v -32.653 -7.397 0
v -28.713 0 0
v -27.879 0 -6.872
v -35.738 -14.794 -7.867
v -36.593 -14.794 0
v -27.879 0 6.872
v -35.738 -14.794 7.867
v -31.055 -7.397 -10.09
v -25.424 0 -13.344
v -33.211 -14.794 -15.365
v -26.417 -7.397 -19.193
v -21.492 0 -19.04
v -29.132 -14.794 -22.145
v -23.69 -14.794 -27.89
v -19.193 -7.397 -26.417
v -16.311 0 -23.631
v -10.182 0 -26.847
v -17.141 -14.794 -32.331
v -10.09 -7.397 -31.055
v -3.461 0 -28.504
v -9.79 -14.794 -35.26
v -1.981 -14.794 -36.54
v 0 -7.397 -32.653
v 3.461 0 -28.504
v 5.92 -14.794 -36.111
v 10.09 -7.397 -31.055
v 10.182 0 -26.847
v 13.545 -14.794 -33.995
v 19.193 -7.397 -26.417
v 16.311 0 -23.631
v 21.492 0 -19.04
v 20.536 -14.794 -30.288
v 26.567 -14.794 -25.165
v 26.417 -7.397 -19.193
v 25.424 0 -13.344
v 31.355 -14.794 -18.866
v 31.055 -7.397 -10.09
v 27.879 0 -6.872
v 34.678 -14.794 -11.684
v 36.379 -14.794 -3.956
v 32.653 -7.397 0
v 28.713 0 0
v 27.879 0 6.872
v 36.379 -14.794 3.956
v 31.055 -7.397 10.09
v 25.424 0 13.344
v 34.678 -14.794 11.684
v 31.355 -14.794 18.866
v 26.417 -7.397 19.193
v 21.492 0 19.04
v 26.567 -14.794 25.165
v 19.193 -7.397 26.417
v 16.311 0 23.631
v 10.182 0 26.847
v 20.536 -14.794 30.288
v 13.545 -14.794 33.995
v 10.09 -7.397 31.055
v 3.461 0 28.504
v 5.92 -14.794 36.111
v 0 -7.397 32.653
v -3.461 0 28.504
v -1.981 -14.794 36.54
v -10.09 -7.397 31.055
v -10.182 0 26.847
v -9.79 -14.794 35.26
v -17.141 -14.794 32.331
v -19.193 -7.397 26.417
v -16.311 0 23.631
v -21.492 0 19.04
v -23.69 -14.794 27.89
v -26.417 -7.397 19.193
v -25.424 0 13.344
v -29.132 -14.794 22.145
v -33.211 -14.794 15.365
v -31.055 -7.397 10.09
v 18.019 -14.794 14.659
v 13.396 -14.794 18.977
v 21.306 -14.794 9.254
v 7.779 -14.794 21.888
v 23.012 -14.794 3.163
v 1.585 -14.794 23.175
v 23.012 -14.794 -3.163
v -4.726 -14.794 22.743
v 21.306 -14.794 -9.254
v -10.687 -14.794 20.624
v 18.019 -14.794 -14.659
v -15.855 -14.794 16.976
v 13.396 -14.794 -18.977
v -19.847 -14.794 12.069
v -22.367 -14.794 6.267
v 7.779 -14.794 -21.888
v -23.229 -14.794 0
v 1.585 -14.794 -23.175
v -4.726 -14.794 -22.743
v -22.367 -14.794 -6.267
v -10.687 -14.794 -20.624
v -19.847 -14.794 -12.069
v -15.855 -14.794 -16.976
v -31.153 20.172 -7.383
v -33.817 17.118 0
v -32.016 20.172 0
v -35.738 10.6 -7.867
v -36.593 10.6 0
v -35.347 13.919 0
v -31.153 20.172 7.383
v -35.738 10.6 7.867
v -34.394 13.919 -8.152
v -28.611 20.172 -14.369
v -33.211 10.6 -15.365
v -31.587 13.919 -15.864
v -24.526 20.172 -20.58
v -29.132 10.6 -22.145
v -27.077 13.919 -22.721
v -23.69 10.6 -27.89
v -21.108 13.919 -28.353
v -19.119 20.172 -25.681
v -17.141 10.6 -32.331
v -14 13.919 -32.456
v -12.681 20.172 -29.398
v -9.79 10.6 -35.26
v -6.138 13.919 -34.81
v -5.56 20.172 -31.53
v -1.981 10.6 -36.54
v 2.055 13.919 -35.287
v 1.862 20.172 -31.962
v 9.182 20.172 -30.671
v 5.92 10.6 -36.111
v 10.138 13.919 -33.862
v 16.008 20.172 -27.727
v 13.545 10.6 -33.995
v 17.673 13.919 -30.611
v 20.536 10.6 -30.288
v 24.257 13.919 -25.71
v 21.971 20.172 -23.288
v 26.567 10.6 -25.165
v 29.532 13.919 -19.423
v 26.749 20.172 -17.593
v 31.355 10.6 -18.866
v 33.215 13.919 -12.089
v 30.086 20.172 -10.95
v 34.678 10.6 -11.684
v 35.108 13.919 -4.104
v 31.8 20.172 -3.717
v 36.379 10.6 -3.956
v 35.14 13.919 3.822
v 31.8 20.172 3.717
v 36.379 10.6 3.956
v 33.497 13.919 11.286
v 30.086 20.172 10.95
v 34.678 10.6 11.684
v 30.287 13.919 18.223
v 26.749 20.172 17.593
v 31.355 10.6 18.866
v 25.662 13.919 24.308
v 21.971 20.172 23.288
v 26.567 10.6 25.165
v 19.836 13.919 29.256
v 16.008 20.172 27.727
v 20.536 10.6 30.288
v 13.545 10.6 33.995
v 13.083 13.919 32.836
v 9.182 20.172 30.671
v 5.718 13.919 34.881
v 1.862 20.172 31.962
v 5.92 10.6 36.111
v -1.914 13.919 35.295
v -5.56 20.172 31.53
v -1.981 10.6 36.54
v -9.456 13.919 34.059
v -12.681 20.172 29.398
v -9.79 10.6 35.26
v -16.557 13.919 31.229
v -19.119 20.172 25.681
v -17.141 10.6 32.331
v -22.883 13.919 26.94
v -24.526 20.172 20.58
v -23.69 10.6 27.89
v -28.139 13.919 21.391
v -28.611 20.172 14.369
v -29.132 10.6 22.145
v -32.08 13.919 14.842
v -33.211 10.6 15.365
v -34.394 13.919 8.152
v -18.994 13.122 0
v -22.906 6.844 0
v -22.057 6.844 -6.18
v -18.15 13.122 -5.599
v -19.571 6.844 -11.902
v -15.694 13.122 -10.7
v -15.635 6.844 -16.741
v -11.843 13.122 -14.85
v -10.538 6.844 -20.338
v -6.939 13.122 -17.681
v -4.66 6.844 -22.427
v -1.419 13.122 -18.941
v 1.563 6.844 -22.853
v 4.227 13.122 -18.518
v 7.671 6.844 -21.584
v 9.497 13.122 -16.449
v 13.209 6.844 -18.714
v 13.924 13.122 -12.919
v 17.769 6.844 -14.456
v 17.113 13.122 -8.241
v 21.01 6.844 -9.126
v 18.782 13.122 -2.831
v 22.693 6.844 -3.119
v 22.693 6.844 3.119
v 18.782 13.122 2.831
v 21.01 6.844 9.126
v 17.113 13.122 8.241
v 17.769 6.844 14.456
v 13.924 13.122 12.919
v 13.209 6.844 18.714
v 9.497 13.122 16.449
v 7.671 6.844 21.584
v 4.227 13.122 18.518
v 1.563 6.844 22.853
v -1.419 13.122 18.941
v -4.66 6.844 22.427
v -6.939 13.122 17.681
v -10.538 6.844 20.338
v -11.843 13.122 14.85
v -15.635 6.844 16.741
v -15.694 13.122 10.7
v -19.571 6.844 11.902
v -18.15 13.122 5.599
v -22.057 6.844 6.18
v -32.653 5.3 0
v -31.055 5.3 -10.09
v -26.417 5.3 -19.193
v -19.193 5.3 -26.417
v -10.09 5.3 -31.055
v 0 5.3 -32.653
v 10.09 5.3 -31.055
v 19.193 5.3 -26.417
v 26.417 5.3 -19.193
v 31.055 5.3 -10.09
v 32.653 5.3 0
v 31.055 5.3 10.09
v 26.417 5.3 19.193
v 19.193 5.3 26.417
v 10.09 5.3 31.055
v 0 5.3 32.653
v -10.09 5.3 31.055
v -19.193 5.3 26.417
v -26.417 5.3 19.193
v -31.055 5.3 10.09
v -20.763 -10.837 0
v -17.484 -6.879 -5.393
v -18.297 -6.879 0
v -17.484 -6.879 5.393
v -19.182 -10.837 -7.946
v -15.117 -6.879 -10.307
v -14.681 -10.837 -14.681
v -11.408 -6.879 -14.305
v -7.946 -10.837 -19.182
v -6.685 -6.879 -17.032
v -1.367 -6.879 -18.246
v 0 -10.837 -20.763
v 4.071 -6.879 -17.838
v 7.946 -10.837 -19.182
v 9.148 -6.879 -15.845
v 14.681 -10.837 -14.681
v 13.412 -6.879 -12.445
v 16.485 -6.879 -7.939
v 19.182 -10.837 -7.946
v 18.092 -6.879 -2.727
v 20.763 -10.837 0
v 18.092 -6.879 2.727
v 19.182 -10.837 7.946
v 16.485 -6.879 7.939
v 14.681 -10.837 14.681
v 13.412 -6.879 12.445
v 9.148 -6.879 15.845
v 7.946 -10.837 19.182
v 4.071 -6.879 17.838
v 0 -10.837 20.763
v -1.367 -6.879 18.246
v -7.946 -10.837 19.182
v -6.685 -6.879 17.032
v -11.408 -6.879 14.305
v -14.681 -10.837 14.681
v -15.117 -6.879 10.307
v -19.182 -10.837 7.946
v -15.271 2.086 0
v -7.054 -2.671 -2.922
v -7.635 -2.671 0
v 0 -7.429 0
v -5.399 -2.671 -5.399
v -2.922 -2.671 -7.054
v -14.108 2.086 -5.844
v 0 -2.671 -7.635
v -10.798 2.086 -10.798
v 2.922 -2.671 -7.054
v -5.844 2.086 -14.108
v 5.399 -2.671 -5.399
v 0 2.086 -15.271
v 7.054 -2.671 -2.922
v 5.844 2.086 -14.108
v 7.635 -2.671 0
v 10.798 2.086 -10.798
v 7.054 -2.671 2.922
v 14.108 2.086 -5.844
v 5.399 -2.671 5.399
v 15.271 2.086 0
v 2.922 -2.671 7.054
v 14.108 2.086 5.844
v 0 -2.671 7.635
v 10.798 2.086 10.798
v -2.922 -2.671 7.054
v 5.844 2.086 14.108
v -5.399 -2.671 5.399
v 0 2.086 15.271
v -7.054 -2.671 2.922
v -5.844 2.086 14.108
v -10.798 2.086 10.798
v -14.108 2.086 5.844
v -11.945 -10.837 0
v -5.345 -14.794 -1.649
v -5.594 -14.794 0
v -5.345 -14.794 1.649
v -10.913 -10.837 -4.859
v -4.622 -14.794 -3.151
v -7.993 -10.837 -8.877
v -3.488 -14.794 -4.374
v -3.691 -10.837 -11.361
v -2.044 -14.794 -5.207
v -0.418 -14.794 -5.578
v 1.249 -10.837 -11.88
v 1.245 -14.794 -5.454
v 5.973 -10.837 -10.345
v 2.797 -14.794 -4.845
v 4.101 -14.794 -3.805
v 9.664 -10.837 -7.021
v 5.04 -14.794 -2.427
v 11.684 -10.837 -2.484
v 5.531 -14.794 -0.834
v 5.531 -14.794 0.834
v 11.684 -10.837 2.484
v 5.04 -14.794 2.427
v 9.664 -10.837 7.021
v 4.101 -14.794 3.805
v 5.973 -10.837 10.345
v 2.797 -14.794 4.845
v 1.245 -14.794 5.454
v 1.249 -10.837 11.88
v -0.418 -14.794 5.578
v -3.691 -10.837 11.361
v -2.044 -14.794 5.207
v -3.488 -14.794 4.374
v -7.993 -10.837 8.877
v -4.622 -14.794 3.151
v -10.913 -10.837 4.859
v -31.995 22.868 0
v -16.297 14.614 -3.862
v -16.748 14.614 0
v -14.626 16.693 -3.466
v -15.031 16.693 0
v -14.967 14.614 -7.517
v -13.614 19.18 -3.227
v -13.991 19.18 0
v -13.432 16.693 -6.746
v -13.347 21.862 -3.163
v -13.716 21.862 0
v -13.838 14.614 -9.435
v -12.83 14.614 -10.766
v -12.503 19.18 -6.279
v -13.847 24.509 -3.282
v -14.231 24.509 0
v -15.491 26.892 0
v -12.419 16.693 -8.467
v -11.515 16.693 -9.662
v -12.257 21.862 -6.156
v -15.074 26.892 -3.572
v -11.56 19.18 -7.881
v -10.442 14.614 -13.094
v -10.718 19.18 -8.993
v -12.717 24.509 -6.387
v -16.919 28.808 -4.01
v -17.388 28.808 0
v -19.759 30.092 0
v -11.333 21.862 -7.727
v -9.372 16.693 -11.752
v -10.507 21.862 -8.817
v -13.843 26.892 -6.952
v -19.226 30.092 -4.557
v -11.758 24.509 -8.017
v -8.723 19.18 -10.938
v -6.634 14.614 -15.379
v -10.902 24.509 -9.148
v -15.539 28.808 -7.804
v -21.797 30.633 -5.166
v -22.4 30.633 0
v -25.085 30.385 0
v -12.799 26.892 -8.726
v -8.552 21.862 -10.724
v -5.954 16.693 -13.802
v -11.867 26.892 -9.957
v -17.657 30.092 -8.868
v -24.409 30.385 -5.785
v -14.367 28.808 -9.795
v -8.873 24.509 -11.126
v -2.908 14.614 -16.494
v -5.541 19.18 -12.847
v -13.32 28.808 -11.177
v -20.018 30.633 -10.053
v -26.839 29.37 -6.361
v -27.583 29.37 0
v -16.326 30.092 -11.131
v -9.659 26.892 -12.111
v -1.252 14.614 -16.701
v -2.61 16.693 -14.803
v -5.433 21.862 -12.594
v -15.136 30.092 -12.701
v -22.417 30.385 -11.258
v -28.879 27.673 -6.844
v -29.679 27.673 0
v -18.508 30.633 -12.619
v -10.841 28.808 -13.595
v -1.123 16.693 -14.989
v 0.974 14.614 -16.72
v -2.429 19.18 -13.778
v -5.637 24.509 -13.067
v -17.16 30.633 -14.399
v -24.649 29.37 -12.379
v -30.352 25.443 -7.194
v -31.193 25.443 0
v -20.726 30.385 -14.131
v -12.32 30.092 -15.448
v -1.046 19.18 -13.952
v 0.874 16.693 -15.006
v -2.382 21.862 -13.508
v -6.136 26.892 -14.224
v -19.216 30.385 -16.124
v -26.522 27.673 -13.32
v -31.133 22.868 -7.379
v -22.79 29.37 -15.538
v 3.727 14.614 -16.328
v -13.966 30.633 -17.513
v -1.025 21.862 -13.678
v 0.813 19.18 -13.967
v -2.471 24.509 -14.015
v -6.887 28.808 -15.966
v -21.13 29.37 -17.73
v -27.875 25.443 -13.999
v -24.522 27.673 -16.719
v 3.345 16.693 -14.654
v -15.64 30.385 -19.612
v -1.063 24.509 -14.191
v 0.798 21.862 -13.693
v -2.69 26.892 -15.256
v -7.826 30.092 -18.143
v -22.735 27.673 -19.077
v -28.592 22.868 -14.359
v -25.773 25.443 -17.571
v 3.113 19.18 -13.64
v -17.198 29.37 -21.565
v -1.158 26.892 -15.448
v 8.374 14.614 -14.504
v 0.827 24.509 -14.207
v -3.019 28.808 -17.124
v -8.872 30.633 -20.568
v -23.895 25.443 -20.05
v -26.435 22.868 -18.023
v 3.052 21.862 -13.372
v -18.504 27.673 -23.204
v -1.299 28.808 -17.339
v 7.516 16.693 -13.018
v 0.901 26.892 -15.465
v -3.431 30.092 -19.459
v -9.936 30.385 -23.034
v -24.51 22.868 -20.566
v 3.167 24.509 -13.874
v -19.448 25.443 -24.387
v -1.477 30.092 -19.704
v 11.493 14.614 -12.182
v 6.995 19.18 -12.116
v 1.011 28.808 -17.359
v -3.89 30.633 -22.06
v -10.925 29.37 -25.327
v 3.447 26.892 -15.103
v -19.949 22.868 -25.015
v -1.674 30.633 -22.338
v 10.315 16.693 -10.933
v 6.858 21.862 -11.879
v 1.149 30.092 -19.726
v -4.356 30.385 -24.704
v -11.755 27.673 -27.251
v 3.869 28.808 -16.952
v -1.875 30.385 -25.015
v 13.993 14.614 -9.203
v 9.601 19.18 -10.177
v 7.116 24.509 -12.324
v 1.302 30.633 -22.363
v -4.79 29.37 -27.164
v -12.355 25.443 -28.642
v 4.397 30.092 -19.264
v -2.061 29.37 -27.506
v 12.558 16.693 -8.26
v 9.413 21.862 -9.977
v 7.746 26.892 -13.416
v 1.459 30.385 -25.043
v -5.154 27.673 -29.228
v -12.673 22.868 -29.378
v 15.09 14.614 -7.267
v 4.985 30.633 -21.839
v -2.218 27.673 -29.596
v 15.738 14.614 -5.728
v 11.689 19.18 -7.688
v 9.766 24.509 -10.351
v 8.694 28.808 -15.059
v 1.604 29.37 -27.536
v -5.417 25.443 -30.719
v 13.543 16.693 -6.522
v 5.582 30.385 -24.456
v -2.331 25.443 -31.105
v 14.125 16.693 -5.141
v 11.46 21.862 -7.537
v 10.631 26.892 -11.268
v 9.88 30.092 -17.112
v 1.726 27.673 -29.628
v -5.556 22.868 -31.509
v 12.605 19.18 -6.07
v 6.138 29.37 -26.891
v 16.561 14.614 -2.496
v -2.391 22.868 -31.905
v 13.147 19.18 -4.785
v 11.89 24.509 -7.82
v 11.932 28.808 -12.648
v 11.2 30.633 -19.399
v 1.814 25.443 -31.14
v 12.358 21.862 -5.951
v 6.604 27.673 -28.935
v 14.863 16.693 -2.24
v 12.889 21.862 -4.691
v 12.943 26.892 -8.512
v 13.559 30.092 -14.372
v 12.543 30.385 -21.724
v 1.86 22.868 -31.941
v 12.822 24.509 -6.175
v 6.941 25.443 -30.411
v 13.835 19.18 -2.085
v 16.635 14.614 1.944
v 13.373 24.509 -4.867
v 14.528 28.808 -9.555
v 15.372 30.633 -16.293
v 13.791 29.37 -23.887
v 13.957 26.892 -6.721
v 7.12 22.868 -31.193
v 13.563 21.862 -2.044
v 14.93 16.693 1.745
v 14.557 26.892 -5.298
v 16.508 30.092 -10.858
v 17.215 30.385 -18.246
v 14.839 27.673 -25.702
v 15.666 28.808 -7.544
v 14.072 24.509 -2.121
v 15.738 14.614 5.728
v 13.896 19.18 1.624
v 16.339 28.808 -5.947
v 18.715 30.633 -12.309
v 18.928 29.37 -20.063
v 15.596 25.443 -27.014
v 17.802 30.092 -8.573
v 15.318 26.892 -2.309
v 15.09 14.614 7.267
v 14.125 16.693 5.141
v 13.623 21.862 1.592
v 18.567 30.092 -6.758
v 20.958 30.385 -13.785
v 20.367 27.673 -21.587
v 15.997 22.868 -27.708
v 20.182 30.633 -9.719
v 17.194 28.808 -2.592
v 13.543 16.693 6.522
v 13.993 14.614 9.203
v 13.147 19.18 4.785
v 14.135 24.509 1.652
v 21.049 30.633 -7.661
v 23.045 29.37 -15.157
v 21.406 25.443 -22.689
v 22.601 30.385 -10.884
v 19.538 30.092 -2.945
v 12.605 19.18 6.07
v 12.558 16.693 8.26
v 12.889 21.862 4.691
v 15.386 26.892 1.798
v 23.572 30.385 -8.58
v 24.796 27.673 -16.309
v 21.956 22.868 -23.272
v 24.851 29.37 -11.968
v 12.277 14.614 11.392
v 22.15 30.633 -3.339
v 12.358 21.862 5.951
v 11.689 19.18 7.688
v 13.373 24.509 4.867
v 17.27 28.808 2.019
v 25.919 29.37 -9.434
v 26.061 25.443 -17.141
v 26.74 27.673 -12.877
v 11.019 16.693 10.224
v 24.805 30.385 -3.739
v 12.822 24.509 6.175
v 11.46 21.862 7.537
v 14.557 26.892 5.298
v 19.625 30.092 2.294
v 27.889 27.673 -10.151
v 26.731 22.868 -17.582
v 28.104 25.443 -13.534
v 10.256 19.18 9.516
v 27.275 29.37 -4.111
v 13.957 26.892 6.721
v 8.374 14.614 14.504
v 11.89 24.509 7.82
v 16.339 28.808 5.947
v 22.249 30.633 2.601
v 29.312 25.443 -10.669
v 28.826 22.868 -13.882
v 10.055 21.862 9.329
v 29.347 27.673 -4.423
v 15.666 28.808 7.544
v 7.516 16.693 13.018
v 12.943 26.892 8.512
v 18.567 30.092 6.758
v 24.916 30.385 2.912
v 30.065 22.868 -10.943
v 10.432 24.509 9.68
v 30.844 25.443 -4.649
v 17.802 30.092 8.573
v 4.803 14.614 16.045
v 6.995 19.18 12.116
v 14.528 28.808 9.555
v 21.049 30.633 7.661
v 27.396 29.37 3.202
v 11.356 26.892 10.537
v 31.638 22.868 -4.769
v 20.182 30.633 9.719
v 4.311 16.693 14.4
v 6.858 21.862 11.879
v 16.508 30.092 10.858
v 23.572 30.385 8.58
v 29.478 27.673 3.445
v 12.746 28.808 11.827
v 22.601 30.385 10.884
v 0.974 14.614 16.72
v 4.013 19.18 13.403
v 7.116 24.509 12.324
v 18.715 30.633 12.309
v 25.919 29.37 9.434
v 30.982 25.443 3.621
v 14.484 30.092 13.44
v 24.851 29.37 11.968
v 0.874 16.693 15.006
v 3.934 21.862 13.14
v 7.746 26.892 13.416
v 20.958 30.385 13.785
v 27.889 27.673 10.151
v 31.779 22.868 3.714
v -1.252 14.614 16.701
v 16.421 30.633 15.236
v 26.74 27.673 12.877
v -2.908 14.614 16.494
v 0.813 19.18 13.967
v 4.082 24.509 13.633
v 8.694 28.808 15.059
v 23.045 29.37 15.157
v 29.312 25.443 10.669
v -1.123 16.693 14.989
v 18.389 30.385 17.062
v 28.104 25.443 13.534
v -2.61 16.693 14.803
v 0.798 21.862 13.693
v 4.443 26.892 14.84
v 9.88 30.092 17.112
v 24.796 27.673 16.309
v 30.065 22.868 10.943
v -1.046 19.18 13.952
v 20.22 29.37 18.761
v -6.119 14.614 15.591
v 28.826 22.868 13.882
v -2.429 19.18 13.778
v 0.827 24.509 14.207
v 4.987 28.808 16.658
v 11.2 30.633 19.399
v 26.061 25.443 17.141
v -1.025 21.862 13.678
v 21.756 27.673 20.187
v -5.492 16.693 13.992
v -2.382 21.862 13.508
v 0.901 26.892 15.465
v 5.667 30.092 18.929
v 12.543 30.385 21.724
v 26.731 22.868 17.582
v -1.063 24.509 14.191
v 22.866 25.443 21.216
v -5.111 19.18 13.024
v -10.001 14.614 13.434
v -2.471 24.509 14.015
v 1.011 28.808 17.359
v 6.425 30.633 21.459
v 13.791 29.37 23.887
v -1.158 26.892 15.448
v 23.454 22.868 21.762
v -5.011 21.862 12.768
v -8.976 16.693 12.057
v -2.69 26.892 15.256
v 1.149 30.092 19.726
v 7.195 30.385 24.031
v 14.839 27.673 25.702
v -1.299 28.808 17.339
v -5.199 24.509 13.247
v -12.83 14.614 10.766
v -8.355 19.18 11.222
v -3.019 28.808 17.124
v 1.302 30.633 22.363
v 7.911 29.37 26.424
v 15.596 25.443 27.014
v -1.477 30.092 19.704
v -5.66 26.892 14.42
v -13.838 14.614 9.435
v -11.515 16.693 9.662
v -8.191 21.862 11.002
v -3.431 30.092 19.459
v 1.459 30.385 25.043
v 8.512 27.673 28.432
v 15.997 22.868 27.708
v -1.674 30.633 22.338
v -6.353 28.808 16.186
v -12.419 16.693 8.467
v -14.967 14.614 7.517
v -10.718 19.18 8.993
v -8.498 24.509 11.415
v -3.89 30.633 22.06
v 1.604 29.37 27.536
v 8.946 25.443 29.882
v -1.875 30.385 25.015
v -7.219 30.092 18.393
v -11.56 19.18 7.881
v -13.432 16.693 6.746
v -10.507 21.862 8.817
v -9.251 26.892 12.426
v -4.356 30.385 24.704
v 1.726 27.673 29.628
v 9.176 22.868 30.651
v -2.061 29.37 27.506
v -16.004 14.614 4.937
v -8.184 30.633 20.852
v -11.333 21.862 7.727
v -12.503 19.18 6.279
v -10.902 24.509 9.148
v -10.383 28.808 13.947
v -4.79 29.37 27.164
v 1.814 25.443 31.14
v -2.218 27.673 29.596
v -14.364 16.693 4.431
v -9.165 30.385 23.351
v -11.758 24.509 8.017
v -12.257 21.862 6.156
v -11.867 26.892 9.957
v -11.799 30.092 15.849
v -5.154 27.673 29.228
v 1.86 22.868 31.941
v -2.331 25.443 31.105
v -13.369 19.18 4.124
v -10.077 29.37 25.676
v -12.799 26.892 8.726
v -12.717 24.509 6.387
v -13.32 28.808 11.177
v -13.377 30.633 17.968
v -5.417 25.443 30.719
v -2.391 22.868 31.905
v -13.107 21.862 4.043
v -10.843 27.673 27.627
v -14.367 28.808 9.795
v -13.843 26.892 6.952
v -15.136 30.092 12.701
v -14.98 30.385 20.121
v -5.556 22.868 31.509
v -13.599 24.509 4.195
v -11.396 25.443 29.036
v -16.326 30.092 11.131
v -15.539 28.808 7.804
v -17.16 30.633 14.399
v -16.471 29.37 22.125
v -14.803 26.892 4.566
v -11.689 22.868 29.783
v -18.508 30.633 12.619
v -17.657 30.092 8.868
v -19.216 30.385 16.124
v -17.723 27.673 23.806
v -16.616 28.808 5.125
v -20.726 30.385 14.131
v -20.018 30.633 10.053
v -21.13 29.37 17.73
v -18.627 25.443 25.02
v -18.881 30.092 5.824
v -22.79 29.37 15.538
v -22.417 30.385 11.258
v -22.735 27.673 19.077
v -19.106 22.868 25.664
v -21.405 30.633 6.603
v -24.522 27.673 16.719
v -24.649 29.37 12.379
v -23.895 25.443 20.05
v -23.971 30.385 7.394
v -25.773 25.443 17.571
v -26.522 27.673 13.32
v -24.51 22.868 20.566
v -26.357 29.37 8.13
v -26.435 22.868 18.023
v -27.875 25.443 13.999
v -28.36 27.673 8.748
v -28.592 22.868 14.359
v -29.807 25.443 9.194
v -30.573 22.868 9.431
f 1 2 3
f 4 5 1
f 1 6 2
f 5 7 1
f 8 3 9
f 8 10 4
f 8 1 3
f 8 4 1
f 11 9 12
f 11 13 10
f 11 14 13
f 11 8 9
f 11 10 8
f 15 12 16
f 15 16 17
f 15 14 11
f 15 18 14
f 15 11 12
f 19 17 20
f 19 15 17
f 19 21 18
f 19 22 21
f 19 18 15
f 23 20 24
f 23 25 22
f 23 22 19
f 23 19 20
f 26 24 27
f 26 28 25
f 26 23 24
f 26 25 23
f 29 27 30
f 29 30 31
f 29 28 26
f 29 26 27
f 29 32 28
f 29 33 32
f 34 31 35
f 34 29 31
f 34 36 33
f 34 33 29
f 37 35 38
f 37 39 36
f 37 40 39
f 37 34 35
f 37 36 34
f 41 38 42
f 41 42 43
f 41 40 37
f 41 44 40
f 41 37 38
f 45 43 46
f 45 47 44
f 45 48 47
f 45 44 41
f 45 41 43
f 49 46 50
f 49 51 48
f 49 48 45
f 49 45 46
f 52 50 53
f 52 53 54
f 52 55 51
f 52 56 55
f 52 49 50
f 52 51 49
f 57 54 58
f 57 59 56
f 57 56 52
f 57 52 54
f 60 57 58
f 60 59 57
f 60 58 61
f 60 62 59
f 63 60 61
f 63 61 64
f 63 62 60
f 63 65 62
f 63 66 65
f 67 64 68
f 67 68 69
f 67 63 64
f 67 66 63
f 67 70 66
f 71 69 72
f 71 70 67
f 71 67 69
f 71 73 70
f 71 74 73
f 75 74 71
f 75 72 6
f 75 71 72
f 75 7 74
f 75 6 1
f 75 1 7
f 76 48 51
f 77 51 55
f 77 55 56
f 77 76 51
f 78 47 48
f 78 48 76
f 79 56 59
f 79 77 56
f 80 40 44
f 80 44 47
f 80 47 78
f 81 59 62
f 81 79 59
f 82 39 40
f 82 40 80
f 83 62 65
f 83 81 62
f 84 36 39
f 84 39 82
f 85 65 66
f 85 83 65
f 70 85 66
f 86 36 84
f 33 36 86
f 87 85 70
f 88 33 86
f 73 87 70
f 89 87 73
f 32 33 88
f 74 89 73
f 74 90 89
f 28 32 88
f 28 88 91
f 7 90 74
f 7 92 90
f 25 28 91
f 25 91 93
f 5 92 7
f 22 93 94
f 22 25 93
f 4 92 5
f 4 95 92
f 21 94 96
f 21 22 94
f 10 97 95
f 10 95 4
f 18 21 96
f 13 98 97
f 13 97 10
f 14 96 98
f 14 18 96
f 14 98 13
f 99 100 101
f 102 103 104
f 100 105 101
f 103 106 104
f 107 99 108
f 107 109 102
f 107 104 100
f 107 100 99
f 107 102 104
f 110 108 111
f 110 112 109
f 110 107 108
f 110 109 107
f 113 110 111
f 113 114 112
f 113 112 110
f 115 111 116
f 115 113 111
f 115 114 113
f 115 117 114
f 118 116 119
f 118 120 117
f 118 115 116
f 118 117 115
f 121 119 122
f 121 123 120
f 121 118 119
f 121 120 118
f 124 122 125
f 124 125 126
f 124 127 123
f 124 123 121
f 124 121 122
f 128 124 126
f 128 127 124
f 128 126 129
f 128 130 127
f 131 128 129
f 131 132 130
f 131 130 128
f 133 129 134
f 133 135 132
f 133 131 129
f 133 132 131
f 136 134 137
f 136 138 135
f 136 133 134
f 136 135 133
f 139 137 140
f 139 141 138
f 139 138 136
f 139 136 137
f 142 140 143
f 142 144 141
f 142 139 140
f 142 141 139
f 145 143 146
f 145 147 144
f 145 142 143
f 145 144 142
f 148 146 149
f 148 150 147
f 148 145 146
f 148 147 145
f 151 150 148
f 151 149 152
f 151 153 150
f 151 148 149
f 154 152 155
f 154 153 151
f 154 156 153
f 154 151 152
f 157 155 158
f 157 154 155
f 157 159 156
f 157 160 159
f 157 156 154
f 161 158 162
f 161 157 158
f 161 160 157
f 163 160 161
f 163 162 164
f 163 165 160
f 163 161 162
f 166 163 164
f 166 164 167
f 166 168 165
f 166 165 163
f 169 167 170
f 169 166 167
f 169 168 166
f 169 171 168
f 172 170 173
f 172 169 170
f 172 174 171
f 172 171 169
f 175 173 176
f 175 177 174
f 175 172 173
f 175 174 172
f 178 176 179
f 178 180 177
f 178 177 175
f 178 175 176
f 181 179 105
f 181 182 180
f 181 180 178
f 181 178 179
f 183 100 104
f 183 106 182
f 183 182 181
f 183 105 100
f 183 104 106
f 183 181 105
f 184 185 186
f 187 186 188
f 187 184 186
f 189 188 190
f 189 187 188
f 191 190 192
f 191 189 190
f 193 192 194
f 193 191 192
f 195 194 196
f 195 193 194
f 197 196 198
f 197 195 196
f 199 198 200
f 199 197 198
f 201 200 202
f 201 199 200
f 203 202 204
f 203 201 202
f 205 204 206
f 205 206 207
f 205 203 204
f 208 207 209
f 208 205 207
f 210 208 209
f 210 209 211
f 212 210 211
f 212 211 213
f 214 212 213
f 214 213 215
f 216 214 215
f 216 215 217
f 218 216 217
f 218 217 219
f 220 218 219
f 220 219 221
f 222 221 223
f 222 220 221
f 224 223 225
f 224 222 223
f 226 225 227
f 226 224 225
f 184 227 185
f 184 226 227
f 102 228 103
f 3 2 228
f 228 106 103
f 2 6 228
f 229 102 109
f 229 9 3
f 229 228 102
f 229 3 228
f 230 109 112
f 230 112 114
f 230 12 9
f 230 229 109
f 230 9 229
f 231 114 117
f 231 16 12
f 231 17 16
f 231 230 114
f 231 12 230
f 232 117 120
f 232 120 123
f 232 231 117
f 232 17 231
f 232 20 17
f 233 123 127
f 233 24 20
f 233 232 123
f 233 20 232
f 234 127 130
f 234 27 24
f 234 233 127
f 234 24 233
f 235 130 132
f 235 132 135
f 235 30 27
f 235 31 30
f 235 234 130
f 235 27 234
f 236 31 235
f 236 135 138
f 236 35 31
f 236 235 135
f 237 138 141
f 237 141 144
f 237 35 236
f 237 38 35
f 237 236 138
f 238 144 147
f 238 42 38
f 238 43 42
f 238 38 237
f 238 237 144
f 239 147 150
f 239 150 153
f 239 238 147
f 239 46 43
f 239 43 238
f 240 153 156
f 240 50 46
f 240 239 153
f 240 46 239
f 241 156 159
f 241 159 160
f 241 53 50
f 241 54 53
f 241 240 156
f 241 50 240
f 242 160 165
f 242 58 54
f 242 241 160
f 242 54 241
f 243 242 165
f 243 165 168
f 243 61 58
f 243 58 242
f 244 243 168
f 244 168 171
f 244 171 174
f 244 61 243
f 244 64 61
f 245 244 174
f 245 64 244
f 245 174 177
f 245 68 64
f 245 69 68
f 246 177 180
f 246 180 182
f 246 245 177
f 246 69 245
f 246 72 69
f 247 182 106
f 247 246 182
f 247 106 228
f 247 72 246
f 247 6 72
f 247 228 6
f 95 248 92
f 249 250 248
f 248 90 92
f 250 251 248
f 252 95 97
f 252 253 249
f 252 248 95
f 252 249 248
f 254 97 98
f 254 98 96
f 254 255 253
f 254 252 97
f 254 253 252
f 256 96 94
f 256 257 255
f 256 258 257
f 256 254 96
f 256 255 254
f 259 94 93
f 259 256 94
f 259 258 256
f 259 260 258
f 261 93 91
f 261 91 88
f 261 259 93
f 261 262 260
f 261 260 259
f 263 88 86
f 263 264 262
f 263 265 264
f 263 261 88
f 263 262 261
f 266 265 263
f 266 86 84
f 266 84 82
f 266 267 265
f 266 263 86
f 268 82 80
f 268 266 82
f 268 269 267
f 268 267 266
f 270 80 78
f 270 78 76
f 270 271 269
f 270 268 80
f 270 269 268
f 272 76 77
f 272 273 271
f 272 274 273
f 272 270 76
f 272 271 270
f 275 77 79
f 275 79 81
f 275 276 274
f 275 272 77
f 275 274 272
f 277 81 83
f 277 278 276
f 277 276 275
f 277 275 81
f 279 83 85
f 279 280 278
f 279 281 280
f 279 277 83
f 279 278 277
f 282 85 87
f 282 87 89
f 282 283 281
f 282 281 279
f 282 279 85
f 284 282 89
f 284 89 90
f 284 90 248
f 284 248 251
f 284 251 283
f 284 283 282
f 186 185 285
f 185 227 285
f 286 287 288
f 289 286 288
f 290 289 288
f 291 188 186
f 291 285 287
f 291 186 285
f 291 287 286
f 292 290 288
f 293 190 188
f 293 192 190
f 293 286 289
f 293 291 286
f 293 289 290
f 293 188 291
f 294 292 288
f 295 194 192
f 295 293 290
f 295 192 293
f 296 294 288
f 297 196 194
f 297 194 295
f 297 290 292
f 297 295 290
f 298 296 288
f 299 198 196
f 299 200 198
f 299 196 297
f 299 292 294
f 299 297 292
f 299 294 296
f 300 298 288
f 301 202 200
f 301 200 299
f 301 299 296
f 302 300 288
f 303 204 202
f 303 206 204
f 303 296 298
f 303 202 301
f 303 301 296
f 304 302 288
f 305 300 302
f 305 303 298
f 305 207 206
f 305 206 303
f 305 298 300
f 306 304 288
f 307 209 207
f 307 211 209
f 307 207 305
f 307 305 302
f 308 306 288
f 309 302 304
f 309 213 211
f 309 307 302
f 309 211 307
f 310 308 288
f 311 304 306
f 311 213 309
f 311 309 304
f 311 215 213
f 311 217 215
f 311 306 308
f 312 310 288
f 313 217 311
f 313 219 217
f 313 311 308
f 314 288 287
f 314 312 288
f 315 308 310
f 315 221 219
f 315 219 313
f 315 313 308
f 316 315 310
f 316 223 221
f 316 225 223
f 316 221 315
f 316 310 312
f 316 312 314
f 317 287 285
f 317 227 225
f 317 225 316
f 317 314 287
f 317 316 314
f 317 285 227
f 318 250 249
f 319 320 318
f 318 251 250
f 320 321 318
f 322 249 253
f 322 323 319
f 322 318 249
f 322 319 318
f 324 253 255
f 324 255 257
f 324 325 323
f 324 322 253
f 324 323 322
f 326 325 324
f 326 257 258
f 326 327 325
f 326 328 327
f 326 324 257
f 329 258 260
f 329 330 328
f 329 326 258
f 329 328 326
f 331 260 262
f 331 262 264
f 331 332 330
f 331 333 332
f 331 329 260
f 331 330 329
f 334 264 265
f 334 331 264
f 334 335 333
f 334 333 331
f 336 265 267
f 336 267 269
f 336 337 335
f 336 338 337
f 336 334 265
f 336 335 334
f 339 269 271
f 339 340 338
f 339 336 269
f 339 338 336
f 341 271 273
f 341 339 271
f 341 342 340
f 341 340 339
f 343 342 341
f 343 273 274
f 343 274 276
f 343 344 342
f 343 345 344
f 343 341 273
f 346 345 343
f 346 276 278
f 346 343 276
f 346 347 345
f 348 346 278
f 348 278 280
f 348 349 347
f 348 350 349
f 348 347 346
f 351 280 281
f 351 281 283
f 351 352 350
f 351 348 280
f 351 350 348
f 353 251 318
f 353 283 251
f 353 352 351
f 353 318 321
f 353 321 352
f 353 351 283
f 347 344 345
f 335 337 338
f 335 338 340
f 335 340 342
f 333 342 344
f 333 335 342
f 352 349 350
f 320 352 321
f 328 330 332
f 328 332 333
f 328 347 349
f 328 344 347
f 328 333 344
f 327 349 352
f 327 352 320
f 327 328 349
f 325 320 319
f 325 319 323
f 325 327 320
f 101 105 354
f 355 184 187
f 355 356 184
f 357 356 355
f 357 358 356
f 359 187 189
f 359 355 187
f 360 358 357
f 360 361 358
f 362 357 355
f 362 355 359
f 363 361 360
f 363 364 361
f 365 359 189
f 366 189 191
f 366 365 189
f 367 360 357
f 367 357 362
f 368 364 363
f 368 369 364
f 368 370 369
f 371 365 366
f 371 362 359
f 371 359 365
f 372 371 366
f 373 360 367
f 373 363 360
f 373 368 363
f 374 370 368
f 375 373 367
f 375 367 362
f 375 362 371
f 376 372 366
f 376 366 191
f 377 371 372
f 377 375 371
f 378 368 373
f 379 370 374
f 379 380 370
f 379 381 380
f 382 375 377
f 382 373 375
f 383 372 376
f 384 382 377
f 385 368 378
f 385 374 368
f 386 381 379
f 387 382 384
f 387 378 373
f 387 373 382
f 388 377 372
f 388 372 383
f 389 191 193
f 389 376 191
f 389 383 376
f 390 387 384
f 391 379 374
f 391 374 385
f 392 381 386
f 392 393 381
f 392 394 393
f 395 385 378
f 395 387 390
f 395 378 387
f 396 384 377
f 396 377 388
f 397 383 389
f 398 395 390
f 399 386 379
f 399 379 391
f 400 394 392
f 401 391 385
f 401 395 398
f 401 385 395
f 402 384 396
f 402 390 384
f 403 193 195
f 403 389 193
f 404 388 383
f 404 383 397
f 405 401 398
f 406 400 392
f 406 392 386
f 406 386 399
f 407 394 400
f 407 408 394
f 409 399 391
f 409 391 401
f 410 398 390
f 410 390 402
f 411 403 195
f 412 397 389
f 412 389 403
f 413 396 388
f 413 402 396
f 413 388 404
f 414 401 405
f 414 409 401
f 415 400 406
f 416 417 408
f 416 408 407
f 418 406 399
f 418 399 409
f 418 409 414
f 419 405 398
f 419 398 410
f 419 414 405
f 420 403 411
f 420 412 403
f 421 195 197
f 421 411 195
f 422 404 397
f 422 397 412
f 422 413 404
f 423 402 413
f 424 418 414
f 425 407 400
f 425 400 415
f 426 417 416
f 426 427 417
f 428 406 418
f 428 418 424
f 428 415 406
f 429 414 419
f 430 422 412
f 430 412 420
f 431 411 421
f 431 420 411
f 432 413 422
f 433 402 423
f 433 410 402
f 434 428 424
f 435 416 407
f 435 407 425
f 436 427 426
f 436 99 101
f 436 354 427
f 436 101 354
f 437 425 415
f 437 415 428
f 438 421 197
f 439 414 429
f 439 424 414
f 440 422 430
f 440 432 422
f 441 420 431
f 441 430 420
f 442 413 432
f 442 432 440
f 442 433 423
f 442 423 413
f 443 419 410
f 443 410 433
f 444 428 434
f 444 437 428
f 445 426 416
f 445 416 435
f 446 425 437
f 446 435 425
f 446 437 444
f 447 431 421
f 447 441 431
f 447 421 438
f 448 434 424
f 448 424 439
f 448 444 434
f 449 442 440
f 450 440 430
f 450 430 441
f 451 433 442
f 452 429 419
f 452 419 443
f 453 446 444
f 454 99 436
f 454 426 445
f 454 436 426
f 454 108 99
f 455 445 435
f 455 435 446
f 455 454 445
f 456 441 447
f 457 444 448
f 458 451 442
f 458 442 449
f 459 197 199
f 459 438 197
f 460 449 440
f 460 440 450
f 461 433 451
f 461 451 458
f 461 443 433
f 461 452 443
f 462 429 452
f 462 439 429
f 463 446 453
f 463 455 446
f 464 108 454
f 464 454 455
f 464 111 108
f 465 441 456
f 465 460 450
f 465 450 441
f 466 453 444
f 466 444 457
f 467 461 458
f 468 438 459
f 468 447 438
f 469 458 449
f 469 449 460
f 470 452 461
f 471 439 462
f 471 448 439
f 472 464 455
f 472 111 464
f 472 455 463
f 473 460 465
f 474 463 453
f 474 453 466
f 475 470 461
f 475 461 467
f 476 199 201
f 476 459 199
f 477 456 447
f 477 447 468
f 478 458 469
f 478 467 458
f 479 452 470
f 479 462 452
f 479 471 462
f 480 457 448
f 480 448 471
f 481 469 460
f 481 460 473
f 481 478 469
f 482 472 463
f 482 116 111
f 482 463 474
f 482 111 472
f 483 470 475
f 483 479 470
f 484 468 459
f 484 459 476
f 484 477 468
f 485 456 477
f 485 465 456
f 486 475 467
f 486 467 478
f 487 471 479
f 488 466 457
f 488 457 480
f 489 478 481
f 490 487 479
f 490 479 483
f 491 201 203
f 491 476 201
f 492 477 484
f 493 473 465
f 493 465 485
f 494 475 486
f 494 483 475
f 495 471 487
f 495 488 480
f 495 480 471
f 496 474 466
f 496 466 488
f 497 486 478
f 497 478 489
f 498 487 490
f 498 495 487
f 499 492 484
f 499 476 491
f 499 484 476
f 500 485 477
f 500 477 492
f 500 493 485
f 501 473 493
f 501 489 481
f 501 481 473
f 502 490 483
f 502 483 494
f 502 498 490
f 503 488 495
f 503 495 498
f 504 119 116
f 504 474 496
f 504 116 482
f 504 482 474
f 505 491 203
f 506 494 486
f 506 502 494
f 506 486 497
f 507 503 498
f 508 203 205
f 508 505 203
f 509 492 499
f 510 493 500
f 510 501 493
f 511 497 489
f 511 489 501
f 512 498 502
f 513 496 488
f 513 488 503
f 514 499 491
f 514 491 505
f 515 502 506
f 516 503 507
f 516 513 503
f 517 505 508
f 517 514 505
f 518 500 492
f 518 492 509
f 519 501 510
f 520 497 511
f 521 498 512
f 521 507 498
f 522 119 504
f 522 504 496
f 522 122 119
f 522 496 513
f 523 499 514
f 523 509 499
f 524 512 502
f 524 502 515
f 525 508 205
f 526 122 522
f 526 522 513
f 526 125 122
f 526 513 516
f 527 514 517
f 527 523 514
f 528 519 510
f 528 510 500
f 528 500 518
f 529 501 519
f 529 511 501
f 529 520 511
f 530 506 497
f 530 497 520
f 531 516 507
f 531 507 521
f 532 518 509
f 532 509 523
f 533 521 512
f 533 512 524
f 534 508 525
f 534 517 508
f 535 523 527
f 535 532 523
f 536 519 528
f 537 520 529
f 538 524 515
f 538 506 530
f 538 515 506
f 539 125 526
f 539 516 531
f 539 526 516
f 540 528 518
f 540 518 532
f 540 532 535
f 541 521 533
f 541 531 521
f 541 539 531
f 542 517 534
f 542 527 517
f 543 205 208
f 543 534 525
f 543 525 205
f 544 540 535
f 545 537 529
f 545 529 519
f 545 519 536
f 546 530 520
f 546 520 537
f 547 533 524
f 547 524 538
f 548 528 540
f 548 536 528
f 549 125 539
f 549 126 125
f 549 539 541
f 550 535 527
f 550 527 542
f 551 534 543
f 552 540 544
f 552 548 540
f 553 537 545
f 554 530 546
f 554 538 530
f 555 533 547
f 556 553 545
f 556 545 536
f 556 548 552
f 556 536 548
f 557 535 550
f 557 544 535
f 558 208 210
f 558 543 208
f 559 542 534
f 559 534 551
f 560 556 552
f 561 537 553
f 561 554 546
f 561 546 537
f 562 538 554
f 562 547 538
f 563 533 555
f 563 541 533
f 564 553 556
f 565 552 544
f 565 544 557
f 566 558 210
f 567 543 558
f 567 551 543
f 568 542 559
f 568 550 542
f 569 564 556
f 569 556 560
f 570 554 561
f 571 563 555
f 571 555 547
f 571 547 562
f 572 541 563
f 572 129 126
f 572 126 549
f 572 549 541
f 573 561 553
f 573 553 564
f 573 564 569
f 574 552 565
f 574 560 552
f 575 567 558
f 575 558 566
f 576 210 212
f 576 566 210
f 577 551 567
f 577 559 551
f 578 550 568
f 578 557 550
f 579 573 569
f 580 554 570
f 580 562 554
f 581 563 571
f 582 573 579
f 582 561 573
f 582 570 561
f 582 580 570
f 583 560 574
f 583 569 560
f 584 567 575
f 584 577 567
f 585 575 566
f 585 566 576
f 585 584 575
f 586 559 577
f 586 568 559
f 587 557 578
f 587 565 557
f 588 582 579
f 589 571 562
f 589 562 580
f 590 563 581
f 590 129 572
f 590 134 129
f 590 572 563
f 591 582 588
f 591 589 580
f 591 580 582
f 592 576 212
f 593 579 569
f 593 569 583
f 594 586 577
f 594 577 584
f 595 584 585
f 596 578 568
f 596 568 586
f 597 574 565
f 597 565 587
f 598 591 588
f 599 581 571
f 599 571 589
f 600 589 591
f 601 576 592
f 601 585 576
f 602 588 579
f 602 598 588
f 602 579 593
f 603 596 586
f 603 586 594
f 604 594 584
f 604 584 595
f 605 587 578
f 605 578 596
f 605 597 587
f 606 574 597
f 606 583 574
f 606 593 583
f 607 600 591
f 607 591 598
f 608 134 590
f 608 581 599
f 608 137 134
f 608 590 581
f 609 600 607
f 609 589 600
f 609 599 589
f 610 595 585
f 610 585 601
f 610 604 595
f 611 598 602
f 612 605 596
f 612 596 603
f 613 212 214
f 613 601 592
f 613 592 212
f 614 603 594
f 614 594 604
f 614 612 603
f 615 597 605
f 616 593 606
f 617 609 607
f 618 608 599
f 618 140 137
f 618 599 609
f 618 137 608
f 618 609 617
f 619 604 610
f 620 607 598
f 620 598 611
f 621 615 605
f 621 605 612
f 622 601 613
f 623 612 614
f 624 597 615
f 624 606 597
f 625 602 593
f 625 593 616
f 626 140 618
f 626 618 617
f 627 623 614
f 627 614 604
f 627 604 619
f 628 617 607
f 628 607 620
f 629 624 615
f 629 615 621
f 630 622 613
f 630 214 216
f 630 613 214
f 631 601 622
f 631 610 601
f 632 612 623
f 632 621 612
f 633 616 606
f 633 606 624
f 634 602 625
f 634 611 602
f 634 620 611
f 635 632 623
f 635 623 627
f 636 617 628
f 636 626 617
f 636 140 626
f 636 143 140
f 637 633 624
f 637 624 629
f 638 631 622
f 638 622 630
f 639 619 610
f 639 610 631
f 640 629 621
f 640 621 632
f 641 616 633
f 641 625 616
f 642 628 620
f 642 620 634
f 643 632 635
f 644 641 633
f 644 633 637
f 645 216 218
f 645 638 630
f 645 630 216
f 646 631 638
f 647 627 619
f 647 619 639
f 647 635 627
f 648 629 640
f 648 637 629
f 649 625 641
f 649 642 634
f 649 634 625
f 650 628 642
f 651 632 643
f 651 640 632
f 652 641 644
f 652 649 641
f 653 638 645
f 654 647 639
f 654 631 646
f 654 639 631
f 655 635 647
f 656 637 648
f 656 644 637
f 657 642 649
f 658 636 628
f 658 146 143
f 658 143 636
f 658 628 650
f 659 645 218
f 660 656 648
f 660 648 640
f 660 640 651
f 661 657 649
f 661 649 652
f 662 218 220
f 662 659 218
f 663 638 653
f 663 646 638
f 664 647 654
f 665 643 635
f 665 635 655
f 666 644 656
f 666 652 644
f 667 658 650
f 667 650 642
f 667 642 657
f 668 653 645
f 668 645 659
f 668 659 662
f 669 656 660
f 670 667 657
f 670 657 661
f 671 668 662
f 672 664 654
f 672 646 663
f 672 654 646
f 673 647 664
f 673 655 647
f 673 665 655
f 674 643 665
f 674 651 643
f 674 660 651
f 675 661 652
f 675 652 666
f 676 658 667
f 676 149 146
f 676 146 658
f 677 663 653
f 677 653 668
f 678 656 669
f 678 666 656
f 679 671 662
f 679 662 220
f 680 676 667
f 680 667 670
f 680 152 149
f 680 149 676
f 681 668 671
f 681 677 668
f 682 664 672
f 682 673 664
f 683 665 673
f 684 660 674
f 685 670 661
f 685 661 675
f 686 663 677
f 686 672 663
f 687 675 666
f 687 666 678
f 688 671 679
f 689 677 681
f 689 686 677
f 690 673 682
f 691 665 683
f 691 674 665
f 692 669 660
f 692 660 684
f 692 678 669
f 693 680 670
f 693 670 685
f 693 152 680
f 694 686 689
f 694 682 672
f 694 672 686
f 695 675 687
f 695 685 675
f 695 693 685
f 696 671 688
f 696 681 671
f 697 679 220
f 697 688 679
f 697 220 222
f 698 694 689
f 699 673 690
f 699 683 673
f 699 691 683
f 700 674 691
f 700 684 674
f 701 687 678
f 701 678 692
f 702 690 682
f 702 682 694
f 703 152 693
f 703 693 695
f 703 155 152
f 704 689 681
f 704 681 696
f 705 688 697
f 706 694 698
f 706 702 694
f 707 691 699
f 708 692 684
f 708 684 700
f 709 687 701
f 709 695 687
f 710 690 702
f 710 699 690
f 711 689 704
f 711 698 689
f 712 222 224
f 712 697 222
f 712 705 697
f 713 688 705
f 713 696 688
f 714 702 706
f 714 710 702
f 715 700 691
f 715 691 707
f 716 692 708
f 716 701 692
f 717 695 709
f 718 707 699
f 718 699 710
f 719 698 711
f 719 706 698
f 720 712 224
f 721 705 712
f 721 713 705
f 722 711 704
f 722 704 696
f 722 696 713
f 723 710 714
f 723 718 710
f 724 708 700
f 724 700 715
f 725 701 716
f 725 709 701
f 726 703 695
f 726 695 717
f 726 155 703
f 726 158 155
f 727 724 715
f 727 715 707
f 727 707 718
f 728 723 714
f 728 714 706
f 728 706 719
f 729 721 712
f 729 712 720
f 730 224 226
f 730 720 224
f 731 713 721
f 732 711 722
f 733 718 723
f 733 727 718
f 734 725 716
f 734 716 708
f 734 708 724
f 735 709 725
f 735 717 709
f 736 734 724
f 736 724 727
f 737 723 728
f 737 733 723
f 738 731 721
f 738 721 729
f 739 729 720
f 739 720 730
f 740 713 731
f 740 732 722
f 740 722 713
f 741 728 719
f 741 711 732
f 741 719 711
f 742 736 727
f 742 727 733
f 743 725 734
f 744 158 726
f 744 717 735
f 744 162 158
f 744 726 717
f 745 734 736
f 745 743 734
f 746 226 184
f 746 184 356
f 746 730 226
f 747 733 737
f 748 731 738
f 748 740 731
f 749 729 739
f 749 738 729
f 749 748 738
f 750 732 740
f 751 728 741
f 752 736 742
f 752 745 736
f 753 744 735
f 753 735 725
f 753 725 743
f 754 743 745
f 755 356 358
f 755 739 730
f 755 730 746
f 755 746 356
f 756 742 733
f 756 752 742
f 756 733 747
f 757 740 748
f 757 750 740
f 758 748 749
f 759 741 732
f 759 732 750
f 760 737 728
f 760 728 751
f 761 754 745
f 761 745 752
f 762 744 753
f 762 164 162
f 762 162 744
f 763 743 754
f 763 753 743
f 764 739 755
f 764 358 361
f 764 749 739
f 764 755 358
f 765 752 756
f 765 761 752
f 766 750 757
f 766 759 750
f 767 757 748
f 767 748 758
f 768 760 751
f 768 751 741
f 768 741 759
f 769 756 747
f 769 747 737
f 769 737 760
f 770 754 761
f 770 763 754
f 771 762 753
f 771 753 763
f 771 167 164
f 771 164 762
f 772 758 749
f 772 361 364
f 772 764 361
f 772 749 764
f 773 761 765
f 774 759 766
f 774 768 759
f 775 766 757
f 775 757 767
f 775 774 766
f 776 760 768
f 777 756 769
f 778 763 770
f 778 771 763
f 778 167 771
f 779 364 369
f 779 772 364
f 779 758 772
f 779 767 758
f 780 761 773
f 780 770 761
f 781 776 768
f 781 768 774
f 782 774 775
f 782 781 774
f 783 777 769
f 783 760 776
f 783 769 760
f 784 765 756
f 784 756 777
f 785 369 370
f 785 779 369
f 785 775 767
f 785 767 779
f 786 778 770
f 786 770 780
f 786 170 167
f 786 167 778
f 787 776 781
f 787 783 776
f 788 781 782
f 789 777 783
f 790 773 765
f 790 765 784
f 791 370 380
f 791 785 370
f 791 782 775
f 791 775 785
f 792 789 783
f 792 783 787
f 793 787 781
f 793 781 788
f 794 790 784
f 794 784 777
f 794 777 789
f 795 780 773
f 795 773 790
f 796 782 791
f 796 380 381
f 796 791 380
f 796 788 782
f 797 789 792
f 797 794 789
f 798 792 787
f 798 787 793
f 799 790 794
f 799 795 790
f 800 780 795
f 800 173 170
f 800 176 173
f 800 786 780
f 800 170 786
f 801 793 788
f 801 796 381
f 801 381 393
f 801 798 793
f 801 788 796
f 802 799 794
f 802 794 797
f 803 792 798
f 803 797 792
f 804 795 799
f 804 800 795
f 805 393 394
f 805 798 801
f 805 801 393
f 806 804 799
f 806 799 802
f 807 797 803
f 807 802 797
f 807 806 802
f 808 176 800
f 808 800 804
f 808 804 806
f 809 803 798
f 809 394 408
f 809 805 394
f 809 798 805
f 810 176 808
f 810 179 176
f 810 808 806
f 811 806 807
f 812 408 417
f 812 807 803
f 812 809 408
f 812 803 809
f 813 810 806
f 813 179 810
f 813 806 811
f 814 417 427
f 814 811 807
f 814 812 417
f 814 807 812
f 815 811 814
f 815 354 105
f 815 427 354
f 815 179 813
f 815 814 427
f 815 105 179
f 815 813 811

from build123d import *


with BuildPart() as f1:
    # F0 (on Top) → F1 (revolve)
    with BuildSketch(Plane.XY):
        with BuildLine():
            ThreePointArc((-18.994163, 13.121947), (-18.526276, 29.537549), (-32.016402, 20.172325))
            ThreePointArc((-32.016402, 20.172325), (-34.616866, 15.535363), (-36.593492, 10.600104))
            Line((-36.593492, 10.600104), (-28.713267, 0))
            Line((-28.713267, 0), (-36.593492, -14.794178))
            Line((-36.593492, -14.794178), (-23.228711, -14.794178))
            Line((-23.228711, -14.794178), (-18.296746, -6.879023))
            Line((-18.296746, -6.879023), (-5.593964, -14.794178))
            Line((-5.593964, -14.794178), (0, -14.794178))
            Line((0, -14.794178), (0, -7.429056))
            Line((0, -7.429056), (-22.906089, 6.84382))
            Line((-22.906089, 6.84382), (-18.994163, 13.121947))
        make_face()
    revolve(axis=Axis((0, -11.111617, 0), (0, -1, 0)))


solid = f1.part
